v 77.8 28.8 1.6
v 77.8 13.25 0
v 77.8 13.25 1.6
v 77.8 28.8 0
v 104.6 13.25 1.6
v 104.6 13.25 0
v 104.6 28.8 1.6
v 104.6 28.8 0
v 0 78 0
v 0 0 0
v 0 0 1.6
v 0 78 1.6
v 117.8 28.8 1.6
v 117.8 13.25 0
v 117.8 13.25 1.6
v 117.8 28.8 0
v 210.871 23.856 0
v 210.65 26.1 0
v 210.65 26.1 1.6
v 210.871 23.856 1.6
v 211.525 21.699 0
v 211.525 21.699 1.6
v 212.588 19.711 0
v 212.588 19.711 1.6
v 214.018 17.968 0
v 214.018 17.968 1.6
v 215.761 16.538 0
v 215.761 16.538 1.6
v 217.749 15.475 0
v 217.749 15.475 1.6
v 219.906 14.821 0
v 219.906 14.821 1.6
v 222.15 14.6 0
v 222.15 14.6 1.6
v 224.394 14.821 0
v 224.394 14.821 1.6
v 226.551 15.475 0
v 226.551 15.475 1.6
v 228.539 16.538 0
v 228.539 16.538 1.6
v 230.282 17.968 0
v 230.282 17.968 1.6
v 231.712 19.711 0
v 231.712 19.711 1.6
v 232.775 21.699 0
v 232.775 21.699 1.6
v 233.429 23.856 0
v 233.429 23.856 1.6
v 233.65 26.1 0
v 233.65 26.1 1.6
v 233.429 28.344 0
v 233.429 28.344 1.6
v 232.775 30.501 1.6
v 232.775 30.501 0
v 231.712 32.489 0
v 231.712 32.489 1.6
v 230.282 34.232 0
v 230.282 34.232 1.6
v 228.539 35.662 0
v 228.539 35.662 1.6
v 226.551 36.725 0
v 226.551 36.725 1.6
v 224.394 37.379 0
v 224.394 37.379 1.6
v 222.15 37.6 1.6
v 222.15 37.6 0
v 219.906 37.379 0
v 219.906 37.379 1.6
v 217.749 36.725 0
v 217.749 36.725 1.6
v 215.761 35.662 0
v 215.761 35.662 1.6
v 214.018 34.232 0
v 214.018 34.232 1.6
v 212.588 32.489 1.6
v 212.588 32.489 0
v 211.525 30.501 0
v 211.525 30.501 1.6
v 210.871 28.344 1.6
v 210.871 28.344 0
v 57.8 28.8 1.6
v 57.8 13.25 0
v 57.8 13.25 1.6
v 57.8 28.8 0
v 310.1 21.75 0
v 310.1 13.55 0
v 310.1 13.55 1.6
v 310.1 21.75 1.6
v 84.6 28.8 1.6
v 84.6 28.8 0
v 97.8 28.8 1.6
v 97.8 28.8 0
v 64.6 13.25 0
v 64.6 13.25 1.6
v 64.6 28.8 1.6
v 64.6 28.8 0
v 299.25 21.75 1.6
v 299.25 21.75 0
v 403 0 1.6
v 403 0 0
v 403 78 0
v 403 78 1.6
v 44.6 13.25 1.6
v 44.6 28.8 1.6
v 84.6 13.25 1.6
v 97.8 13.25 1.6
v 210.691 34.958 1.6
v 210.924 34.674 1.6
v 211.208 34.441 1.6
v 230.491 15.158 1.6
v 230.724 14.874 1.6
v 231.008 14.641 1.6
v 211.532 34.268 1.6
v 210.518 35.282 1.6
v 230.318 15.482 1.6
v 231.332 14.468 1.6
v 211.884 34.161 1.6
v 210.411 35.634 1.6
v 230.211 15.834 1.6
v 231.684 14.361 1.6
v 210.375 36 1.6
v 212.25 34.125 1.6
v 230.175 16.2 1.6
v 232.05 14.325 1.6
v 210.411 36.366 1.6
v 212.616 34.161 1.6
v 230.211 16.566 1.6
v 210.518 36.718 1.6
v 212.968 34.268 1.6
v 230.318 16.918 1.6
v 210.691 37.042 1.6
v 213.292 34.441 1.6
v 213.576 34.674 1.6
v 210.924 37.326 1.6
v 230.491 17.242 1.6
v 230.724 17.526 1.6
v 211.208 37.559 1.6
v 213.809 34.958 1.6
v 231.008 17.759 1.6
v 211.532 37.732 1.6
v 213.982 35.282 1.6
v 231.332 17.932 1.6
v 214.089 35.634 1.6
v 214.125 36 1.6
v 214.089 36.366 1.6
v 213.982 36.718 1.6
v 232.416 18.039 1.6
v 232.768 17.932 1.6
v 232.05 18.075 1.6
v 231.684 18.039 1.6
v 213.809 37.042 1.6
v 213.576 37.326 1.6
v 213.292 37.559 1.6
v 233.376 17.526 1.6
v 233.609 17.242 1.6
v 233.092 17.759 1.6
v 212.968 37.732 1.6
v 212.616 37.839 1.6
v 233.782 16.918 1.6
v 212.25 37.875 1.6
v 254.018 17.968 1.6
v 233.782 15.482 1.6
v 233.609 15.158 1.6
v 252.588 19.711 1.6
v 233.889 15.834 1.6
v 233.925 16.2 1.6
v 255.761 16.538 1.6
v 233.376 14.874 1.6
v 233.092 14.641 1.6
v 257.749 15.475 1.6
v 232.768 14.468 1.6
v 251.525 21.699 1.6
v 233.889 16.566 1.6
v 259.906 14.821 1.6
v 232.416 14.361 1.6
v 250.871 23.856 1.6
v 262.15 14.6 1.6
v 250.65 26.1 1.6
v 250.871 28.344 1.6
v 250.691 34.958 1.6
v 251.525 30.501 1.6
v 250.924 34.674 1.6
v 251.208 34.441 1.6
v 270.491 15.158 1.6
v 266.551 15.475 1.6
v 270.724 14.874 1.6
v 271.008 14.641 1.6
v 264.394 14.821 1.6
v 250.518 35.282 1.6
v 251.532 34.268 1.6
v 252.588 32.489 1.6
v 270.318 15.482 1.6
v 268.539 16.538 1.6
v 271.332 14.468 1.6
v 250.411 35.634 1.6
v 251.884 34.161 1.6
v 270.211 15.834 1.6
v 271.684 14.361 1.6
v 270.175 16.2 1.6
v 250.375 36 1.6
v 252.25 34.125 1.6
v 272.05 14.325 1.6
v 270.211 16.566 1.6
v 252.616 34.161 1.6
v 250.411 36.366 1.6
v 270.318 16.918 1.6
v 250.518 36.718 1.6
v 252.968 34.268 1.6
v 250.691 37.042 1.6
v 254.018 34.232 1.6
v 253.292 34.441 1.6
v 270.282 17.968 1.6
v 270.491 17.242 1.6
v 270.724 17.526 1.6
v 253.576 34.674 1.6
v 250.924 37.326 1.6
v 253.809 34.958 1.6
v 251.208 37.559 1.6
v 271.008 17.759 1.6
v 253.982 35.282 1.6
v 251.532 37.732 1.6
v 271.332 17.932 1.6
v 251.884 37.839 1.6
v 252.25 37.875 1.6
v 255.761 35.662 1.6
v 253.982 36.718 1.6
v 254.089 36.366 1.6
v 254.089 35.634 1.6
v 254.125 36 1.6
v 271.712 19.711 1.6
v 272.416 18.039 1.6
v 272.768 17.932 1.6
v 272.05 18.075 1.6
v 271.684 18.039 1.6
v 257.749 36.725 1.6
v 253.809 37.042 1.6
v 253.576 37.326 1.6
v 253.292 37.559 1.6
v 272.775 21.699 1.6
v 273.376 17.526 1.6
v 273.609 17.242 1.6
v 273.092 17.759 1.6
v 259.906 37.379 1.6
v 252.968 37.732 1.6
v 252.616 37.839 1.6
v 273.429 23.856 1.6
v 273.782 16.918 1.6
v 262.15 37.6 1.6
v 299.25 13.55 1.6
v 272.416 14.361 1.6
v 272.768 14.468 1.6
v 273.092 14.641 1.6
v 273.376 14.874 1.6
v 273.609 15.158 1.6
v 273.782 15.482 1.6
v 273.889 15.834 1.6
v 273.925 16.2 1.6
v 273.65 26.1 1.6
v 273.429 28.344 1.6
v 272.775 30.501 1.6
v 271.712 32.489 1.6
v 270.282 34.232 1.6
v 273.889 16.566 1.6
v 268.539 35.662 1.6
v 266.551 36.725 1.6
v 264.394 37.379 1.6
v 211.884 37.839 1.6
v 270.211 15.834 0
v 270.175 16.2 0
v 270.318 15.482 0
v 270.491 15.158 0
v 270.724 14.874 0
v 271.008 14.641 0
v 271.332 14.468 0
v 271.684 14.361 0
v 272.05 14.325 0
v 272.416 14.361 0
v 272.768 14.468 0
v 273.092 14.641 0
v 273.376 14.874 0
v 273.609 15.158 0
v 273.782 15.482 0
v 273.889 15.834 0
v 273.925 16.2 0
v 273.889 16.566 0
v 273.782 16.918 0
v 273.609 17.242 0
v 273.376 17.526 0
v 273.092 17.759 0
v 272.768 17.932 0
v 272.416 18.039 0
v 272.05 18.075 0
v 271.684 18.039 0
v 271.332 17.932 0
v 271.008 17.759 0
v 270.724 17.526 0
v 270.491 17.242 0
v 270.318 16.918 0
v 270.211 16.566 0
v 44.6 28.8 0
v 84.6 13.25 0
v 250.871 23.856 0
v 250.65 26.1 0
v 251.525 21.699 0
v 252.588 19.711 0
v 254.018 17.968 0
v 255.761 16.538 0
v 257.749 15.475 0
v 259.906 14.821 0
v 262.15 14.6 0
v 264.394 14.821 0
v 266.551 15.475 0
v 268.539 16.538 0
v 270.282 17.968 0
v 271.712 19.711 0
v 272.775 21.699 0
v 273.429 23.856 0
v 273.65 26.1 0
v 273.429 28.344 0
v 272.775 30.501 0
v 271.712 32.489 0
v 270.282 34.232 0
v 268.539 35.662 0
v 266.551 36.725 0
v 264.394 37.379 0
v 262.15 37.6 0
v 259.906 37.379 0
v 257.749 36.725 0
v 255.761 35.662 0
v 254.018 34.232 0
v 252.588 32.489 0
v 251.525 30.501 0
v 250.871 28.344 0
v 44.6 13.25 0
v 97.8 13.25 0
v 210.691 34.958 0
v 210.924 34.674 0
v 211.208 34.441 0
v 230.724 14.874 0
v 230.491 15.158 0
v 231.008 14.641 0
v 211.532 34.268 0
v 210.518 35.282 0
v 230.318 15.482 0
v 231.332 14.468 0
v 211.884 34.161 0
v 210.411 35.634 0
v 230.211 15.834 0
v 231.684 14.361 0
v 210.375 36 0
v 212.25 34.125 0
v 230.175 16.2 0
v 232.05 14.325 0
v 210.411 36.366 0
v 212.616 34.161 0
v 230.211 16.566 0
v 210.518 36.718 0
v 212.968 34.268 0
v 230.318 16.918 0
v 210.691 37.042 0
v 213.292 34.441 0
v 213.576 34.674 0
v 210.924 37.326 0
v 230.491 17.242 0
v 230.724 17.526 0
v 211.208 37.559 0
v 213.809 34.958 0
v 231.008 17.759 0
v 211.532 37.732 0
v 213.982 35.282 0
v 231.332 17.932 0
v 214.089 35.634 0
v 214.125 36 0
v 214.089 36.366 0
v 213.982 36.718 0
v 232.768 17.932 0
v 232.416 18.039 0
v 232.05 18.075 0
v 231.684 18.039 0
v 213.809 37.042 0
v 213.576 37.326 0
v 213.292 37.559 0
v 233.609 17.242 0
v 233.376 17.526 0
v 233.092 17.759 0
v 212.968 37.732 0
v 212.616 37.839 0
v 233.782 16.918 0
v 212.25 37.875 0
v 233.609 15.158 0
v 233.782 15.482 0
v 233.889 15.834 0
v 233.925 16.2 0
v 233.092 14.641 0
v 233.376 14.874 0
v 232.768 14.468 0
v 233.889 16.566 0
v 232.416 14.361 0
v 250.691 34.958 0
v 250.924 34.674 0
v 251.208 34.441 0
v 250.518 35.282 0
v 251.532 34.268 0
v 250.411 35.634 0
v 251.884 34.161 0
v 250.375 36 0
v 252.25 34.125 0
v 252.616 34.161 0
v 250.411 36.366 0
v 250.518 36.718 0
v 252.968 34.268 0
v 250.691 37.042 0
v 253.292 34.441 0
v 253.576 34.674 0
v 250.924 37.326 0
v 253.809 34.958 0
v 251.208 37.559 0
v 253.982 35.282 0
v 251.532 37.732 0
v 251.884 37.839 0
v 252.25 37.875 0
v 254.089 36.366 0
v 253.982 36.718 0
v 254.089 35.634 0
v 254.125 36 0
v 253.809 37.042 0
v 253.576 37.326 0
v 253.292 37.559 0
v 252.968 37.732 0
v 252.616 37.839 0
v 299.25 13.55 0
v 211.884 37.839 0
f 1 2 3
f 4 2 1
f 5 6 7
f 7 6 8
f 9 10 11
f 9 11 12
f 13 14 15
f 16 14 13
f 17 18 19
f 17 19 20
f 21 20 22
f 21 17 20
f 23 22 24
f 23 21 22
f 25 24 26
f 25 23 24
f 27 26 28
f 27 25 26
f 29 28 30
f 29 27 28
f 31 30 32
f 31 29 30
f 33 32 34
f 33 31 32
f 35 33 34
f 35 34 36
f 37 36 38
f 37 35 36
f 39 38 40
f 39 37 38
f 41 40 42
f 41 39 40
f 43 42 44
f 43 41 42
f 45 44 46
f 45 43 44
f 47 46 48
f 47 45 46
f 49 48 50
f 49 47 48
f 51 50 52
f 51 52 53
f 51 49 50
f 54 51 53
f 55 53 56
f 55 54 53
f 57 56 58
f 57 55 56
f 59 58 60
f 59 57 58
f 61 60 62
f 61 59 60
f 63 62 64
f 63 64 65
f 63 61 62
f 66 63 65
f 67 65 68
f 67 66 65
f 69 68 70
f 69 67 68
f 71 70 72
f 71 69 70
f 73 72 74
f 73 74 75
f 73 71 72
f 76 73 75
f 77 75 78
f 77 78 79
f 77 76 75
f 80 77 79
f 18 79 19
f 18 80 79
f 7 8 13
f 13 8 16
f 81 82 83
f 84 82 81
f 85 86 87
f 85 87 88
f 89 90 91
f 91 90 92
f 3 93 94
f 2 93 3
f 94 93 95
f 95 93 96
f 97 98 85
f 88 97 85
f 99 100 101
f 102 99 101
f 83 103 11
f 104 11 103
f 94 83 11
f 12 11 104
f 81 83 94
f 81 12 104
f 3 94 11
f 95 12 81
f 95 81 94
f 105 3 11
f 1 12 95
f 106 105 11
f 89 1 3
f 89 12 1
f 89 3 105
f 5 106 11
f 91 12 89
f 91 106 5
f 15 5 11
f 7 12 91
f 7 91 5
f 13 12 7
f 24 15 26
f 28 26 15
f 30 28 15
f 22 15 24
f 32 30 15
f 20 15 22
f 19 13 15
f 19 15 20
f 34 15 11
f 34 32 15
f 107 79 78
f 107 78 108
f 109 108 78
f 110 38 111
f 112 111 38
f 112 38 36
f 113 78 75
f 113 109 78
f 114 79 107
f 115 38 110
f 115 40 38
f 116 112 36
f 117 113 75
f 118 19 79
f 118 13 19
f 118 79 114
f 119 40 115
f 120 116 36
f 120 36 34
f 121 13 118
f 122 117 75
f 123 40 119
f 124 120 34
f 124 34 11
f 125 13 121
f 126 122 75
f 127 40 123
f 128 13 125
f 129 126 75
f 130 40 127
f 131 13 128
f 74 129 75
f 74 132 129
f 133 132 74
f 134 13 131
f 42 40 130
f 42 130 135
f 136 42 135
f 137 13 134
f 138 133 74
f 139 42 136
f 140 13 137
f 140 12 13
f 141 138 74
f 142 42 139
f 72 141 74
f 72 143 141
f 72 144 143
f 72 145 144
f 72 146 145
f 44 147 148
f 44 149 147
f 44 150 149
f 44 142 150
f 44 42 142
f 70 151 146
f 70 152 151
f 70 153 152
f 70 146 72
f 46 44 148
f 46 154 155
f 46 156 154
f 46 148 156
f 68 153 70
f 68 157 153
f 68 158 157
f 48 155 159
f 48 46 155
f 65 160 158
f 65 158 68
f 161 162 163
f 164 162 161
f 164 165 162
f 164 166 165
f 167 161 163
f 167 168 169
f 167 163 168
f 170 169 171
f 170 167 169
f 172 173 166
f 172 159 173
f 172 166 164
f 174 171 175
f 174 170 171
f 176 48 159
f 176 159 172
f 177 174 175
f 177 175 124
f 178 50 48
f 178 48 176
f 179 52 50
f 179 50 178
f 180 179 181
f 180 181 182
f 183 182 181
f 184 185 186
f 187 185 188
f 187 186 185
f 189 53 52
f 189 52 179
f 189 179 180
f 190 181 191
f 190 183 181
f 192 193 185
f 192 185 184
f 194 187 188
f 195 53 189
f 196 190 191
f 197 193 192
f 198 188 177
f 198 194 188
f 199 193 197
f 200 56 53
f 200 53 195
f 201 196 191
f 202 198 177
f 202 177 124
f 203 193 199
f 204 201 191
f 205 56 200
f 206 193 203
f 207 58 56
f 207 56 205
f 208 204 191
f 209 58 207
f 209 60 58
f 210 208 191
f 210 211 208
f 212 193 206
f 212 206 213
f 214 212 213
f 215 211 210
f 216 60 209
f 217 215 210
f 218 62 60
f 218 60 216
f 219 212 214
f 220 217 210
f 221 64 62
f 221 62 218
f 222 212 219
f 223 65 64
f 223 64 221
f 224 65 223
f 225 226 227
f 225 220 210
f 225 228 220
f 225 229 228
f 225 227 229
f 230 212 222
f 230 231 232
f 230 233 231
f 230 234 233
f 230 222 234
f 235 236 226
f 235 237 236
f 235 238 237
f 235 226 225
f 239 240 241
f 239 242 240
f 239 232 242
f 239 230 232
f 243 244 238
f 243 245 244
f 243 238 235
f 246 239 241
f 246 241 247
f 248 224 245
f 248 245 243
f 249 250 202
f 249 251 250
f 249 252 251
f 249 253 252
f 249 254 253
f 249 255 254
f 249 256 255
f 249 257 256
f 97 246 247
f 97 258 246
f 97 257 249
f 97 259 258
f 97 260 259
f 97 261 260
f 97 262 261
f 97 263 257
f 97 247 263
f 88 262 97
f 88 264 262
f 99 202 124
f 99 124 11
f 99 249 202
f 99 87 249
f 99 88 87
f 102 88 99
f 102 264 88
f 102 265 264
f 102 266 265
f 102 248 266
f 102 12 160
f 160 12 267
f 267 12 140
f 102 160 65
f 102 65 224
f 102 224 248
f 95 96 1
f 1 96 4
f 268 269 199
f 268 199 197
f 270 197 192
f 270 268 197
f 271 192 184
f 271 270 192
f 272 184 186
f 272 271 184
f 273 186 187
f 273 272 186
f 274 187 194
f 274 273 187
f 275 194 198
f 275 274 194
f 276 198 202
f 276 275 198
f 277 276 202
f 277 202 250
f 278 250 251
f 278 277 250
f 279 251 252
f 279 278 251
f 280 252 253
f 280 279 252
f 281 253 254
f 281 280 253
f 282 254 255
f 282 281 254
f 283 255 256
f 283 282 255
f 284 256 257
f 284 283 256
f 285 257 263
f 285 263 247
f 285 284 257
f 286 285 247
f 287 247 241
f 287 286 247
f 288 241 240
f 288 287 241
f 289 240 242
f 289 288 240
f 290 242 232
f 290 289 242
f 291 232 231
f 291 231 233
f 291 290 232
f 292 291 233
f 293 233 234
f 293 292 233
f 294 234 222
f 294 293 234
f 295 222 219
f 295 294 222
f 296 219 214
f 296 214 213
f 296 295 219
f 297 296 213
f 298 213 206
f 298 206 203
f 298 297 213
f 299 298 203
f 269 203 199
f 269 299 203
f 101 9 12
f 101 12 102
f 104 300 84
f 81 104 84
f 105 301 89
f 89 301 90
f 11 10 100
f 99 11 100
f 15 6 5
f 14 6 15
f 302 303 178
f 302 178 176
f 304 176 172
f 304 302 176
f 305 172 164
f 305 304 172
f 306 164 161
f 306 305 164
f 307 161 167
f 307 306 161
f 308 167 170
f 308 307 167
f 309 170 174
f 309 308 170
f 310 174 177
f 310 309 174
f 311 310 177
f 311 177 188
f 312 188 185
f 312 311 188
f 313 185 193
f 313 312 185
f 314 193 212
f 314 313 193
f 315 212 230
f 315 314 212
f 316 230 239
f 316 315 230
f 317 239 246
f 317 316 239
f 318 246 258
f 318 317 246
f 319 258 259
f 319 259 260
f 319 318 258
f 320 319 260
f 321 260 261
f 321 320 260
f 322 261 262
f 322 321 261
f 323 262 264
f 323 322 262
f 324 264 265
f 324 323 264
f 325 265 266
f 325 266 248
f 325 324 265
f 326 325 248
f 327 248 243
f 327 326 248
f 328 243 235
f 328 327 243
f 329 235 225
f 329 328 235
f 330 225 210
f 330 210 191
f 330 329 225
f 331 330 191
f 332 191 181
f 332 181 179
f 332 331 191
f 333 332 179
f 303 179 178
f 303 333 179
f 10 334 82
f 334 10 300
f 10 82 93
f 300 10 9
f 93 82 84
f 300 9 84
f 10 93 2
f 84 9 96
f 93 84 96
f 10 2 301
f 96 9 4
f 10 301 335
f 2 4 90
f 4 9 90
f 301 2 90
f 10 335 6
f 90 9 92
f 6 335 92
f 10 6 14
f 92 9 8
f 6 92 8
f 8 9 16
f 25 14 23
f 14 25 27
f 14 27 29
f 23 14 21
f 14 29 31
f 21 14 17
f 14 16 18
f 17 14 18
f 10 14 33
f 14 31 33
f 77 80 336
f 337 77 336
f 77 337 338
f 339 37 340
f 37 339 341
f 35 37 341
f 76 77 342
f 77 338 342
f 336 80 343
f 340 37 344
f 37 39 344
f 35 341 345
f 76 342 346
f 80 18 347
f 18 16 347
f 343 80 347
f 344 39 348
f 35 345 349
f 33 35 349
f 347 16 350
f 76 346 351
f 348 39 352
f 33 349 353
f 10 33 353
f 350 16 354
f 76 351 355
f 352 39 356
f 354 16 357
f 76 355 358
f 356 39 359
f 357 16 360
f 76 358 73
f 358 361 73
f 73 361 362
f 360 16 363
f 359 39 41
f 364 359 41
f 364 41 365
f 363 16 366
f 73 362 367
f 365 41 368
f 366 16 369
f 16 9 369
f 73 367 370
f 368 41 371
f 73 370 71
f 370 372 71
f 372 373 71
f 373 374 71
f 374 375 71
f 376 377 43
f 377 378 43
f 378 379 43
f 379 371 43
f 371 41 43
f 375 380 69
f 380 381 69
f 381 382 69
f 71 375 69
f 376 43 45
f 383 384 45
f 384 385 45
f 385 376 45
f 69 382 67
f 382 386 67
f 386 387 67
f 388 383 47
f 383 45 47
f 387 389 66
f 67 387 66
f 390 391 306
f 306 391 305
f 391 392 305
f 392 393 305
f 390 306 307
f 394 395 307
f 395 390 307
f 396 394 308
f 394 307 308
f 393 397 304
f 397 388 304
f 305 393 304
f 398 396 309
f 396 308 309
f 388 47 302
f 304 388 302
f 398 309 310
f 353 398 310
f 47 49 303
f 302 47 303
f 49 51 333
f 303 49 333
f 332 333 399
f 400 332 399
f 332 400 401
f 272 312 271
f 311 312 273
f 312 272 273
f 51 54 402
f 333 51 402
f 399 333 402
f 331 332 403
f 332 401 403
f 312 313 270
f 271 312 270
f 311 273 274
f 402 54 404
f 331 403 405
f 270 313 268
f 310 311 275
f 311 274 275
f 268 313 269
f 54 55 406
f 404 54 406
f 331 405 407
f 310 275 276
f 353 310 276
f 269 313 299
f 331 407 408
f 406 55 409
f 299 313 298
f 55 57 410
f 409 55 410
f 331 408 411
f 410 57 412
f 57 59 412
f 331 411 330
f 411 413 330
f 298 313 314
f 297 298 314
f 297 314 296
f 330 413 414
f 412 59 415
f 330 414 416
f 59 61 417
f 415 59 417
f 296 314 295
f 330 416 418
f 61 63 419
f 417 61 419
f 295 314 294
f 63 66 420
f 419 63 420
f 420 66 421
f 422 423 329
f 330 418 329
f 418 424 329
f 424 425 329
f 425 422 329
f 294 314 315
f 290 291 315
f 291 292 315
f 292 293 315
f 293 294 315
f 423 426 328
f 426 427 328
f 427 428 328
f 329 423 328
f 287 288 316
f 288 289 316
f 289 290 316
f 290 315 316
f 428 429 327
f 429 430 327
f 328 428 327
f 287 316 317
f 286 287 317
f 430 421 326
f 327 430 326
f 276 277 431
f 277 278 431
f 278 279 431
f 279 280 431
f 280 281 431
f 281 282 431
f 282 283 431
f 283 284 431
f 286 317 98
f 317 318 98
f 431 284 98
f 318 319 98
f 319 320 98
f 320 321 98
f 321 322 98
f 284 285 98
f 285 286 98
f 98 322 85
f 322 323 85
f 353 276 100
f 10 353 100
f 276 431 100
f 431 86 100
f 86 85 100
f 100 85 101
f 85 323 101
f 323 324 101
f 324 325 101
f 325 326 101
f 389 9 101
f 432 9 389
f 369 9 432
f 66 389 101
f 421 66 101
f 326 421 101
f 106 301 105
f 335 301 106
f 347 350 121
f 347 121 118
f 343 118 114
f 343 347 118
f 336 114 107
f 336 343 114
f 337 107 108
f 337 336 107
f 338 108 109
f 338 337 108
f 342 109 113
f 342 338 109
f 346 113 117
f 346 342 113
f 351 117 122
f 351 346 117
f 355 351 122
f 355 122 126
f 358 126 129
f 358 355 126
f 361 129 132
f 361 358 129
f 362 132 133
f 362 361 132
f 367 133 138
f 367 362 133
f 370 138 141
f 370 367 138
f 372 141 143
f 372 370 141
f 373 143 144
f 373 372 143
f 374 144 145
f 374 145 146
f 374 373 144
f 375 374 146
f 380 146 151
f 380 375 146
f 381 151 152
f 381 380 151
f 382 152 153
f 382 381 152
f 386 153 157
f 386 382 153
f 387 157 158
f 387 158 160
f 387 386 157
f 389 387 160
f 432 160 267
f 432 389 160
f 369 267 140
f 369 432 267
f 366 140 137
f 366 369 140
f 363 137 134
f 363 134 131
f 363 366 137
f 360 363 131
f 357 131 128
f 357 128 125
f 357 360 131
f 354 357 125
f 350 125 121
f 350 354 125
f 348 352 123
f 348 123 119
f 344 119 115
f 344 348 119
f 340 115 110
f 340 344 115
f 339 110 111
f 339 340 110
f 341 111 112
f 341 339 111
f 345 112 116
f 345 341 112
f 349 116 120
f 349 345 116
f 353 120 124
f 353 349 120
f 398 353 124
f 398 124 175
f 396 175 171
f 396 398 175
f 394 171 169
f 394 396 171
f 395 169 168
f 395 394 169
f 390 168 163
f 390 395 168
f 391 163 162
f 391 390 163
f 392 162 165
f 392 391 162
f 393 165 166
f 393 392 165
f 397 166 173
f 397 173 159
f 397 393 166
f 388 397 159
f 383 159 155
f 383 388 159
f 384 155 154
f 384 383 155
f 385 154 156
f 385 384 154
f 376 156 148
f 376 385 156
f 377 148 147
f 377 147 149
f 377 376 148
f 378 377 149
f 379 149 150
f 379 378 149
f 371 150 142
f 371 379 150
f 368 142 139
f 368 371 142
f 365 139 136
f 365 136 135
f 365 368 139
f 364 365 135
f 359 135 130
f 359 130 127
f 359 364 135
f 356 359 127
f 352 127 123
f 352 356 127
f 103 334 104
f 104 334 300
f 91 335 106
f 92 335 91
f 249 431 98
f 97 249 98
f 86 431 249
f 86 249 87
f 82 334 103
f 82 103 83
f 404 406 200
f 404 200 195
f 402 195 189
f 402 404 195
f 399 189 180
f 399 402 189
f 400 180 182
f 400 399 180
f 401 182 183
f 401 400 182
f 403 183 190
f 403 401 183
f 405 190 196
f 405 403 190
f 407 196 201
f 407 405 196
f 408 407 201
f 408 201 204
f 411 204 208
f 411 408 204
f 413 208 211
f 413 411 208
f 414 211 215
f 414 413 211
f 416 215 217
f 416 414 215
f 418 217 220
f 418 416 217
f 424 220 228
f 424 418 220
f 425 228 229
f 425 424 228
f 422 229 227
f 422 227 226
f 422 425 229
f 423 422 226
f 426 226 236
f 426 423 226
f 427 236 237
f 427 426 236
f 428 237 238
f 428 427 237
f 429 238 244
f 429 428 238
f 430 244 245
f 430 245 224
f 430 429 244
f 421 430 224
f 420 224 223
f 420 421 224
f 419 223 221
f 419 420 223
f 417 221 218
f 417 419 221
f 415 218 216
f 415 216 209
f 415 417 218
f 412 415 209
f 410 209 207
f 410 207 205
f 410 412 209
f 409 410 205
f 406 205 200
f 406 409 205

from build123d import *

# Parameters (mm, degrees)
PANEL_W             = 403
PANEL_H             = 78
BOSS_EXTRUDE1_DEPTH = 1.6
XLR4_R              = 11.5
XLR4_R_2            = 1.875
CUT_EXTRUDE2_DEPTH  = 1.6
RJ11_W              = 13.2
RJ11_H              = 15.55
CUT_EXTRUDE3_DEPTH  = 1.6
DC_PORT_W           = 10.85
DC_PORT_H           = 8.2
CUT_EXTRUDE4_DEPTH  = 1.6


with BuildPart() as part:
    # Panel → Boss-Extrude1 (new body)
    with BuildSketch(Plane.XY):
        with Locations((201.5, 39)):
            Rectangle(PANEL_W, PANEL_H)
    extrude(amount=BOSS_EXTRUDE1_DEPTH)

    # XLR4 → Cut-Extrude2 (cut)
    with BuildSketch(Plane.XY):
        with Locations(Location((222.15, 26.1, 0), (0, 0, 180))):
            Circle(XLR4_R)
        with Locations(Location((212.25, 36, 0), (0, 0, 180))):
            Circle(XLR4_R_2)
        with Locations(Location((232.05, 16.2, 0), (0, 0, 180))):
            Circle(XLR4_R_2)
        with Locations(Location((262.15, 26.1, 0), (0, 0, 180))):
            Circle(XLR4_R)
        with Locations(Location((252.25, 36, 0), (0, 0, 180))):
            Circle(XLR4_R_2)
        with Locations(Location((272.05, 16.2, 0), (0, 0, 180))):
            Circle(XLR4_R_2)
    extrude(amount=CUT_EXTRUDE2_DEPTH, mode=Mode.SUBTRACT)

    # RJ11 → Cut-Extrude3 (cut)
    with BuildSketch(Plane.XY):
        with Locations((71.2, 21.025)):
            Rectangle(RJ11_W, RJ11_H)
        with Locations((51.2, 21.025)):
            Rectangle(RJ11_W, RJ11_H)
        with Locations((91.2, 21.025)):
            Rectangle(RJ11_W, RJ11_H)
        with Locations((111.2, 21.025)):
            Rectangle(RJ11_W, RJ11_H)
    extrude(amount=CUT_EXTRUDE3_DEPTH, mode=Mode.SUBTRACT)

    # DC PORT → Cut-Extrude4 (cut)
    with BuildSketch(Plane.XY):
        with Locations((304.675, 17.65)):
            Rectangle(DC_PORT_W, DC_PORT_H)
    extrude(amount=CUT_EXTRUDE4_DEPTH, mode=Mode.SUBTRACT)


solid = part.part
